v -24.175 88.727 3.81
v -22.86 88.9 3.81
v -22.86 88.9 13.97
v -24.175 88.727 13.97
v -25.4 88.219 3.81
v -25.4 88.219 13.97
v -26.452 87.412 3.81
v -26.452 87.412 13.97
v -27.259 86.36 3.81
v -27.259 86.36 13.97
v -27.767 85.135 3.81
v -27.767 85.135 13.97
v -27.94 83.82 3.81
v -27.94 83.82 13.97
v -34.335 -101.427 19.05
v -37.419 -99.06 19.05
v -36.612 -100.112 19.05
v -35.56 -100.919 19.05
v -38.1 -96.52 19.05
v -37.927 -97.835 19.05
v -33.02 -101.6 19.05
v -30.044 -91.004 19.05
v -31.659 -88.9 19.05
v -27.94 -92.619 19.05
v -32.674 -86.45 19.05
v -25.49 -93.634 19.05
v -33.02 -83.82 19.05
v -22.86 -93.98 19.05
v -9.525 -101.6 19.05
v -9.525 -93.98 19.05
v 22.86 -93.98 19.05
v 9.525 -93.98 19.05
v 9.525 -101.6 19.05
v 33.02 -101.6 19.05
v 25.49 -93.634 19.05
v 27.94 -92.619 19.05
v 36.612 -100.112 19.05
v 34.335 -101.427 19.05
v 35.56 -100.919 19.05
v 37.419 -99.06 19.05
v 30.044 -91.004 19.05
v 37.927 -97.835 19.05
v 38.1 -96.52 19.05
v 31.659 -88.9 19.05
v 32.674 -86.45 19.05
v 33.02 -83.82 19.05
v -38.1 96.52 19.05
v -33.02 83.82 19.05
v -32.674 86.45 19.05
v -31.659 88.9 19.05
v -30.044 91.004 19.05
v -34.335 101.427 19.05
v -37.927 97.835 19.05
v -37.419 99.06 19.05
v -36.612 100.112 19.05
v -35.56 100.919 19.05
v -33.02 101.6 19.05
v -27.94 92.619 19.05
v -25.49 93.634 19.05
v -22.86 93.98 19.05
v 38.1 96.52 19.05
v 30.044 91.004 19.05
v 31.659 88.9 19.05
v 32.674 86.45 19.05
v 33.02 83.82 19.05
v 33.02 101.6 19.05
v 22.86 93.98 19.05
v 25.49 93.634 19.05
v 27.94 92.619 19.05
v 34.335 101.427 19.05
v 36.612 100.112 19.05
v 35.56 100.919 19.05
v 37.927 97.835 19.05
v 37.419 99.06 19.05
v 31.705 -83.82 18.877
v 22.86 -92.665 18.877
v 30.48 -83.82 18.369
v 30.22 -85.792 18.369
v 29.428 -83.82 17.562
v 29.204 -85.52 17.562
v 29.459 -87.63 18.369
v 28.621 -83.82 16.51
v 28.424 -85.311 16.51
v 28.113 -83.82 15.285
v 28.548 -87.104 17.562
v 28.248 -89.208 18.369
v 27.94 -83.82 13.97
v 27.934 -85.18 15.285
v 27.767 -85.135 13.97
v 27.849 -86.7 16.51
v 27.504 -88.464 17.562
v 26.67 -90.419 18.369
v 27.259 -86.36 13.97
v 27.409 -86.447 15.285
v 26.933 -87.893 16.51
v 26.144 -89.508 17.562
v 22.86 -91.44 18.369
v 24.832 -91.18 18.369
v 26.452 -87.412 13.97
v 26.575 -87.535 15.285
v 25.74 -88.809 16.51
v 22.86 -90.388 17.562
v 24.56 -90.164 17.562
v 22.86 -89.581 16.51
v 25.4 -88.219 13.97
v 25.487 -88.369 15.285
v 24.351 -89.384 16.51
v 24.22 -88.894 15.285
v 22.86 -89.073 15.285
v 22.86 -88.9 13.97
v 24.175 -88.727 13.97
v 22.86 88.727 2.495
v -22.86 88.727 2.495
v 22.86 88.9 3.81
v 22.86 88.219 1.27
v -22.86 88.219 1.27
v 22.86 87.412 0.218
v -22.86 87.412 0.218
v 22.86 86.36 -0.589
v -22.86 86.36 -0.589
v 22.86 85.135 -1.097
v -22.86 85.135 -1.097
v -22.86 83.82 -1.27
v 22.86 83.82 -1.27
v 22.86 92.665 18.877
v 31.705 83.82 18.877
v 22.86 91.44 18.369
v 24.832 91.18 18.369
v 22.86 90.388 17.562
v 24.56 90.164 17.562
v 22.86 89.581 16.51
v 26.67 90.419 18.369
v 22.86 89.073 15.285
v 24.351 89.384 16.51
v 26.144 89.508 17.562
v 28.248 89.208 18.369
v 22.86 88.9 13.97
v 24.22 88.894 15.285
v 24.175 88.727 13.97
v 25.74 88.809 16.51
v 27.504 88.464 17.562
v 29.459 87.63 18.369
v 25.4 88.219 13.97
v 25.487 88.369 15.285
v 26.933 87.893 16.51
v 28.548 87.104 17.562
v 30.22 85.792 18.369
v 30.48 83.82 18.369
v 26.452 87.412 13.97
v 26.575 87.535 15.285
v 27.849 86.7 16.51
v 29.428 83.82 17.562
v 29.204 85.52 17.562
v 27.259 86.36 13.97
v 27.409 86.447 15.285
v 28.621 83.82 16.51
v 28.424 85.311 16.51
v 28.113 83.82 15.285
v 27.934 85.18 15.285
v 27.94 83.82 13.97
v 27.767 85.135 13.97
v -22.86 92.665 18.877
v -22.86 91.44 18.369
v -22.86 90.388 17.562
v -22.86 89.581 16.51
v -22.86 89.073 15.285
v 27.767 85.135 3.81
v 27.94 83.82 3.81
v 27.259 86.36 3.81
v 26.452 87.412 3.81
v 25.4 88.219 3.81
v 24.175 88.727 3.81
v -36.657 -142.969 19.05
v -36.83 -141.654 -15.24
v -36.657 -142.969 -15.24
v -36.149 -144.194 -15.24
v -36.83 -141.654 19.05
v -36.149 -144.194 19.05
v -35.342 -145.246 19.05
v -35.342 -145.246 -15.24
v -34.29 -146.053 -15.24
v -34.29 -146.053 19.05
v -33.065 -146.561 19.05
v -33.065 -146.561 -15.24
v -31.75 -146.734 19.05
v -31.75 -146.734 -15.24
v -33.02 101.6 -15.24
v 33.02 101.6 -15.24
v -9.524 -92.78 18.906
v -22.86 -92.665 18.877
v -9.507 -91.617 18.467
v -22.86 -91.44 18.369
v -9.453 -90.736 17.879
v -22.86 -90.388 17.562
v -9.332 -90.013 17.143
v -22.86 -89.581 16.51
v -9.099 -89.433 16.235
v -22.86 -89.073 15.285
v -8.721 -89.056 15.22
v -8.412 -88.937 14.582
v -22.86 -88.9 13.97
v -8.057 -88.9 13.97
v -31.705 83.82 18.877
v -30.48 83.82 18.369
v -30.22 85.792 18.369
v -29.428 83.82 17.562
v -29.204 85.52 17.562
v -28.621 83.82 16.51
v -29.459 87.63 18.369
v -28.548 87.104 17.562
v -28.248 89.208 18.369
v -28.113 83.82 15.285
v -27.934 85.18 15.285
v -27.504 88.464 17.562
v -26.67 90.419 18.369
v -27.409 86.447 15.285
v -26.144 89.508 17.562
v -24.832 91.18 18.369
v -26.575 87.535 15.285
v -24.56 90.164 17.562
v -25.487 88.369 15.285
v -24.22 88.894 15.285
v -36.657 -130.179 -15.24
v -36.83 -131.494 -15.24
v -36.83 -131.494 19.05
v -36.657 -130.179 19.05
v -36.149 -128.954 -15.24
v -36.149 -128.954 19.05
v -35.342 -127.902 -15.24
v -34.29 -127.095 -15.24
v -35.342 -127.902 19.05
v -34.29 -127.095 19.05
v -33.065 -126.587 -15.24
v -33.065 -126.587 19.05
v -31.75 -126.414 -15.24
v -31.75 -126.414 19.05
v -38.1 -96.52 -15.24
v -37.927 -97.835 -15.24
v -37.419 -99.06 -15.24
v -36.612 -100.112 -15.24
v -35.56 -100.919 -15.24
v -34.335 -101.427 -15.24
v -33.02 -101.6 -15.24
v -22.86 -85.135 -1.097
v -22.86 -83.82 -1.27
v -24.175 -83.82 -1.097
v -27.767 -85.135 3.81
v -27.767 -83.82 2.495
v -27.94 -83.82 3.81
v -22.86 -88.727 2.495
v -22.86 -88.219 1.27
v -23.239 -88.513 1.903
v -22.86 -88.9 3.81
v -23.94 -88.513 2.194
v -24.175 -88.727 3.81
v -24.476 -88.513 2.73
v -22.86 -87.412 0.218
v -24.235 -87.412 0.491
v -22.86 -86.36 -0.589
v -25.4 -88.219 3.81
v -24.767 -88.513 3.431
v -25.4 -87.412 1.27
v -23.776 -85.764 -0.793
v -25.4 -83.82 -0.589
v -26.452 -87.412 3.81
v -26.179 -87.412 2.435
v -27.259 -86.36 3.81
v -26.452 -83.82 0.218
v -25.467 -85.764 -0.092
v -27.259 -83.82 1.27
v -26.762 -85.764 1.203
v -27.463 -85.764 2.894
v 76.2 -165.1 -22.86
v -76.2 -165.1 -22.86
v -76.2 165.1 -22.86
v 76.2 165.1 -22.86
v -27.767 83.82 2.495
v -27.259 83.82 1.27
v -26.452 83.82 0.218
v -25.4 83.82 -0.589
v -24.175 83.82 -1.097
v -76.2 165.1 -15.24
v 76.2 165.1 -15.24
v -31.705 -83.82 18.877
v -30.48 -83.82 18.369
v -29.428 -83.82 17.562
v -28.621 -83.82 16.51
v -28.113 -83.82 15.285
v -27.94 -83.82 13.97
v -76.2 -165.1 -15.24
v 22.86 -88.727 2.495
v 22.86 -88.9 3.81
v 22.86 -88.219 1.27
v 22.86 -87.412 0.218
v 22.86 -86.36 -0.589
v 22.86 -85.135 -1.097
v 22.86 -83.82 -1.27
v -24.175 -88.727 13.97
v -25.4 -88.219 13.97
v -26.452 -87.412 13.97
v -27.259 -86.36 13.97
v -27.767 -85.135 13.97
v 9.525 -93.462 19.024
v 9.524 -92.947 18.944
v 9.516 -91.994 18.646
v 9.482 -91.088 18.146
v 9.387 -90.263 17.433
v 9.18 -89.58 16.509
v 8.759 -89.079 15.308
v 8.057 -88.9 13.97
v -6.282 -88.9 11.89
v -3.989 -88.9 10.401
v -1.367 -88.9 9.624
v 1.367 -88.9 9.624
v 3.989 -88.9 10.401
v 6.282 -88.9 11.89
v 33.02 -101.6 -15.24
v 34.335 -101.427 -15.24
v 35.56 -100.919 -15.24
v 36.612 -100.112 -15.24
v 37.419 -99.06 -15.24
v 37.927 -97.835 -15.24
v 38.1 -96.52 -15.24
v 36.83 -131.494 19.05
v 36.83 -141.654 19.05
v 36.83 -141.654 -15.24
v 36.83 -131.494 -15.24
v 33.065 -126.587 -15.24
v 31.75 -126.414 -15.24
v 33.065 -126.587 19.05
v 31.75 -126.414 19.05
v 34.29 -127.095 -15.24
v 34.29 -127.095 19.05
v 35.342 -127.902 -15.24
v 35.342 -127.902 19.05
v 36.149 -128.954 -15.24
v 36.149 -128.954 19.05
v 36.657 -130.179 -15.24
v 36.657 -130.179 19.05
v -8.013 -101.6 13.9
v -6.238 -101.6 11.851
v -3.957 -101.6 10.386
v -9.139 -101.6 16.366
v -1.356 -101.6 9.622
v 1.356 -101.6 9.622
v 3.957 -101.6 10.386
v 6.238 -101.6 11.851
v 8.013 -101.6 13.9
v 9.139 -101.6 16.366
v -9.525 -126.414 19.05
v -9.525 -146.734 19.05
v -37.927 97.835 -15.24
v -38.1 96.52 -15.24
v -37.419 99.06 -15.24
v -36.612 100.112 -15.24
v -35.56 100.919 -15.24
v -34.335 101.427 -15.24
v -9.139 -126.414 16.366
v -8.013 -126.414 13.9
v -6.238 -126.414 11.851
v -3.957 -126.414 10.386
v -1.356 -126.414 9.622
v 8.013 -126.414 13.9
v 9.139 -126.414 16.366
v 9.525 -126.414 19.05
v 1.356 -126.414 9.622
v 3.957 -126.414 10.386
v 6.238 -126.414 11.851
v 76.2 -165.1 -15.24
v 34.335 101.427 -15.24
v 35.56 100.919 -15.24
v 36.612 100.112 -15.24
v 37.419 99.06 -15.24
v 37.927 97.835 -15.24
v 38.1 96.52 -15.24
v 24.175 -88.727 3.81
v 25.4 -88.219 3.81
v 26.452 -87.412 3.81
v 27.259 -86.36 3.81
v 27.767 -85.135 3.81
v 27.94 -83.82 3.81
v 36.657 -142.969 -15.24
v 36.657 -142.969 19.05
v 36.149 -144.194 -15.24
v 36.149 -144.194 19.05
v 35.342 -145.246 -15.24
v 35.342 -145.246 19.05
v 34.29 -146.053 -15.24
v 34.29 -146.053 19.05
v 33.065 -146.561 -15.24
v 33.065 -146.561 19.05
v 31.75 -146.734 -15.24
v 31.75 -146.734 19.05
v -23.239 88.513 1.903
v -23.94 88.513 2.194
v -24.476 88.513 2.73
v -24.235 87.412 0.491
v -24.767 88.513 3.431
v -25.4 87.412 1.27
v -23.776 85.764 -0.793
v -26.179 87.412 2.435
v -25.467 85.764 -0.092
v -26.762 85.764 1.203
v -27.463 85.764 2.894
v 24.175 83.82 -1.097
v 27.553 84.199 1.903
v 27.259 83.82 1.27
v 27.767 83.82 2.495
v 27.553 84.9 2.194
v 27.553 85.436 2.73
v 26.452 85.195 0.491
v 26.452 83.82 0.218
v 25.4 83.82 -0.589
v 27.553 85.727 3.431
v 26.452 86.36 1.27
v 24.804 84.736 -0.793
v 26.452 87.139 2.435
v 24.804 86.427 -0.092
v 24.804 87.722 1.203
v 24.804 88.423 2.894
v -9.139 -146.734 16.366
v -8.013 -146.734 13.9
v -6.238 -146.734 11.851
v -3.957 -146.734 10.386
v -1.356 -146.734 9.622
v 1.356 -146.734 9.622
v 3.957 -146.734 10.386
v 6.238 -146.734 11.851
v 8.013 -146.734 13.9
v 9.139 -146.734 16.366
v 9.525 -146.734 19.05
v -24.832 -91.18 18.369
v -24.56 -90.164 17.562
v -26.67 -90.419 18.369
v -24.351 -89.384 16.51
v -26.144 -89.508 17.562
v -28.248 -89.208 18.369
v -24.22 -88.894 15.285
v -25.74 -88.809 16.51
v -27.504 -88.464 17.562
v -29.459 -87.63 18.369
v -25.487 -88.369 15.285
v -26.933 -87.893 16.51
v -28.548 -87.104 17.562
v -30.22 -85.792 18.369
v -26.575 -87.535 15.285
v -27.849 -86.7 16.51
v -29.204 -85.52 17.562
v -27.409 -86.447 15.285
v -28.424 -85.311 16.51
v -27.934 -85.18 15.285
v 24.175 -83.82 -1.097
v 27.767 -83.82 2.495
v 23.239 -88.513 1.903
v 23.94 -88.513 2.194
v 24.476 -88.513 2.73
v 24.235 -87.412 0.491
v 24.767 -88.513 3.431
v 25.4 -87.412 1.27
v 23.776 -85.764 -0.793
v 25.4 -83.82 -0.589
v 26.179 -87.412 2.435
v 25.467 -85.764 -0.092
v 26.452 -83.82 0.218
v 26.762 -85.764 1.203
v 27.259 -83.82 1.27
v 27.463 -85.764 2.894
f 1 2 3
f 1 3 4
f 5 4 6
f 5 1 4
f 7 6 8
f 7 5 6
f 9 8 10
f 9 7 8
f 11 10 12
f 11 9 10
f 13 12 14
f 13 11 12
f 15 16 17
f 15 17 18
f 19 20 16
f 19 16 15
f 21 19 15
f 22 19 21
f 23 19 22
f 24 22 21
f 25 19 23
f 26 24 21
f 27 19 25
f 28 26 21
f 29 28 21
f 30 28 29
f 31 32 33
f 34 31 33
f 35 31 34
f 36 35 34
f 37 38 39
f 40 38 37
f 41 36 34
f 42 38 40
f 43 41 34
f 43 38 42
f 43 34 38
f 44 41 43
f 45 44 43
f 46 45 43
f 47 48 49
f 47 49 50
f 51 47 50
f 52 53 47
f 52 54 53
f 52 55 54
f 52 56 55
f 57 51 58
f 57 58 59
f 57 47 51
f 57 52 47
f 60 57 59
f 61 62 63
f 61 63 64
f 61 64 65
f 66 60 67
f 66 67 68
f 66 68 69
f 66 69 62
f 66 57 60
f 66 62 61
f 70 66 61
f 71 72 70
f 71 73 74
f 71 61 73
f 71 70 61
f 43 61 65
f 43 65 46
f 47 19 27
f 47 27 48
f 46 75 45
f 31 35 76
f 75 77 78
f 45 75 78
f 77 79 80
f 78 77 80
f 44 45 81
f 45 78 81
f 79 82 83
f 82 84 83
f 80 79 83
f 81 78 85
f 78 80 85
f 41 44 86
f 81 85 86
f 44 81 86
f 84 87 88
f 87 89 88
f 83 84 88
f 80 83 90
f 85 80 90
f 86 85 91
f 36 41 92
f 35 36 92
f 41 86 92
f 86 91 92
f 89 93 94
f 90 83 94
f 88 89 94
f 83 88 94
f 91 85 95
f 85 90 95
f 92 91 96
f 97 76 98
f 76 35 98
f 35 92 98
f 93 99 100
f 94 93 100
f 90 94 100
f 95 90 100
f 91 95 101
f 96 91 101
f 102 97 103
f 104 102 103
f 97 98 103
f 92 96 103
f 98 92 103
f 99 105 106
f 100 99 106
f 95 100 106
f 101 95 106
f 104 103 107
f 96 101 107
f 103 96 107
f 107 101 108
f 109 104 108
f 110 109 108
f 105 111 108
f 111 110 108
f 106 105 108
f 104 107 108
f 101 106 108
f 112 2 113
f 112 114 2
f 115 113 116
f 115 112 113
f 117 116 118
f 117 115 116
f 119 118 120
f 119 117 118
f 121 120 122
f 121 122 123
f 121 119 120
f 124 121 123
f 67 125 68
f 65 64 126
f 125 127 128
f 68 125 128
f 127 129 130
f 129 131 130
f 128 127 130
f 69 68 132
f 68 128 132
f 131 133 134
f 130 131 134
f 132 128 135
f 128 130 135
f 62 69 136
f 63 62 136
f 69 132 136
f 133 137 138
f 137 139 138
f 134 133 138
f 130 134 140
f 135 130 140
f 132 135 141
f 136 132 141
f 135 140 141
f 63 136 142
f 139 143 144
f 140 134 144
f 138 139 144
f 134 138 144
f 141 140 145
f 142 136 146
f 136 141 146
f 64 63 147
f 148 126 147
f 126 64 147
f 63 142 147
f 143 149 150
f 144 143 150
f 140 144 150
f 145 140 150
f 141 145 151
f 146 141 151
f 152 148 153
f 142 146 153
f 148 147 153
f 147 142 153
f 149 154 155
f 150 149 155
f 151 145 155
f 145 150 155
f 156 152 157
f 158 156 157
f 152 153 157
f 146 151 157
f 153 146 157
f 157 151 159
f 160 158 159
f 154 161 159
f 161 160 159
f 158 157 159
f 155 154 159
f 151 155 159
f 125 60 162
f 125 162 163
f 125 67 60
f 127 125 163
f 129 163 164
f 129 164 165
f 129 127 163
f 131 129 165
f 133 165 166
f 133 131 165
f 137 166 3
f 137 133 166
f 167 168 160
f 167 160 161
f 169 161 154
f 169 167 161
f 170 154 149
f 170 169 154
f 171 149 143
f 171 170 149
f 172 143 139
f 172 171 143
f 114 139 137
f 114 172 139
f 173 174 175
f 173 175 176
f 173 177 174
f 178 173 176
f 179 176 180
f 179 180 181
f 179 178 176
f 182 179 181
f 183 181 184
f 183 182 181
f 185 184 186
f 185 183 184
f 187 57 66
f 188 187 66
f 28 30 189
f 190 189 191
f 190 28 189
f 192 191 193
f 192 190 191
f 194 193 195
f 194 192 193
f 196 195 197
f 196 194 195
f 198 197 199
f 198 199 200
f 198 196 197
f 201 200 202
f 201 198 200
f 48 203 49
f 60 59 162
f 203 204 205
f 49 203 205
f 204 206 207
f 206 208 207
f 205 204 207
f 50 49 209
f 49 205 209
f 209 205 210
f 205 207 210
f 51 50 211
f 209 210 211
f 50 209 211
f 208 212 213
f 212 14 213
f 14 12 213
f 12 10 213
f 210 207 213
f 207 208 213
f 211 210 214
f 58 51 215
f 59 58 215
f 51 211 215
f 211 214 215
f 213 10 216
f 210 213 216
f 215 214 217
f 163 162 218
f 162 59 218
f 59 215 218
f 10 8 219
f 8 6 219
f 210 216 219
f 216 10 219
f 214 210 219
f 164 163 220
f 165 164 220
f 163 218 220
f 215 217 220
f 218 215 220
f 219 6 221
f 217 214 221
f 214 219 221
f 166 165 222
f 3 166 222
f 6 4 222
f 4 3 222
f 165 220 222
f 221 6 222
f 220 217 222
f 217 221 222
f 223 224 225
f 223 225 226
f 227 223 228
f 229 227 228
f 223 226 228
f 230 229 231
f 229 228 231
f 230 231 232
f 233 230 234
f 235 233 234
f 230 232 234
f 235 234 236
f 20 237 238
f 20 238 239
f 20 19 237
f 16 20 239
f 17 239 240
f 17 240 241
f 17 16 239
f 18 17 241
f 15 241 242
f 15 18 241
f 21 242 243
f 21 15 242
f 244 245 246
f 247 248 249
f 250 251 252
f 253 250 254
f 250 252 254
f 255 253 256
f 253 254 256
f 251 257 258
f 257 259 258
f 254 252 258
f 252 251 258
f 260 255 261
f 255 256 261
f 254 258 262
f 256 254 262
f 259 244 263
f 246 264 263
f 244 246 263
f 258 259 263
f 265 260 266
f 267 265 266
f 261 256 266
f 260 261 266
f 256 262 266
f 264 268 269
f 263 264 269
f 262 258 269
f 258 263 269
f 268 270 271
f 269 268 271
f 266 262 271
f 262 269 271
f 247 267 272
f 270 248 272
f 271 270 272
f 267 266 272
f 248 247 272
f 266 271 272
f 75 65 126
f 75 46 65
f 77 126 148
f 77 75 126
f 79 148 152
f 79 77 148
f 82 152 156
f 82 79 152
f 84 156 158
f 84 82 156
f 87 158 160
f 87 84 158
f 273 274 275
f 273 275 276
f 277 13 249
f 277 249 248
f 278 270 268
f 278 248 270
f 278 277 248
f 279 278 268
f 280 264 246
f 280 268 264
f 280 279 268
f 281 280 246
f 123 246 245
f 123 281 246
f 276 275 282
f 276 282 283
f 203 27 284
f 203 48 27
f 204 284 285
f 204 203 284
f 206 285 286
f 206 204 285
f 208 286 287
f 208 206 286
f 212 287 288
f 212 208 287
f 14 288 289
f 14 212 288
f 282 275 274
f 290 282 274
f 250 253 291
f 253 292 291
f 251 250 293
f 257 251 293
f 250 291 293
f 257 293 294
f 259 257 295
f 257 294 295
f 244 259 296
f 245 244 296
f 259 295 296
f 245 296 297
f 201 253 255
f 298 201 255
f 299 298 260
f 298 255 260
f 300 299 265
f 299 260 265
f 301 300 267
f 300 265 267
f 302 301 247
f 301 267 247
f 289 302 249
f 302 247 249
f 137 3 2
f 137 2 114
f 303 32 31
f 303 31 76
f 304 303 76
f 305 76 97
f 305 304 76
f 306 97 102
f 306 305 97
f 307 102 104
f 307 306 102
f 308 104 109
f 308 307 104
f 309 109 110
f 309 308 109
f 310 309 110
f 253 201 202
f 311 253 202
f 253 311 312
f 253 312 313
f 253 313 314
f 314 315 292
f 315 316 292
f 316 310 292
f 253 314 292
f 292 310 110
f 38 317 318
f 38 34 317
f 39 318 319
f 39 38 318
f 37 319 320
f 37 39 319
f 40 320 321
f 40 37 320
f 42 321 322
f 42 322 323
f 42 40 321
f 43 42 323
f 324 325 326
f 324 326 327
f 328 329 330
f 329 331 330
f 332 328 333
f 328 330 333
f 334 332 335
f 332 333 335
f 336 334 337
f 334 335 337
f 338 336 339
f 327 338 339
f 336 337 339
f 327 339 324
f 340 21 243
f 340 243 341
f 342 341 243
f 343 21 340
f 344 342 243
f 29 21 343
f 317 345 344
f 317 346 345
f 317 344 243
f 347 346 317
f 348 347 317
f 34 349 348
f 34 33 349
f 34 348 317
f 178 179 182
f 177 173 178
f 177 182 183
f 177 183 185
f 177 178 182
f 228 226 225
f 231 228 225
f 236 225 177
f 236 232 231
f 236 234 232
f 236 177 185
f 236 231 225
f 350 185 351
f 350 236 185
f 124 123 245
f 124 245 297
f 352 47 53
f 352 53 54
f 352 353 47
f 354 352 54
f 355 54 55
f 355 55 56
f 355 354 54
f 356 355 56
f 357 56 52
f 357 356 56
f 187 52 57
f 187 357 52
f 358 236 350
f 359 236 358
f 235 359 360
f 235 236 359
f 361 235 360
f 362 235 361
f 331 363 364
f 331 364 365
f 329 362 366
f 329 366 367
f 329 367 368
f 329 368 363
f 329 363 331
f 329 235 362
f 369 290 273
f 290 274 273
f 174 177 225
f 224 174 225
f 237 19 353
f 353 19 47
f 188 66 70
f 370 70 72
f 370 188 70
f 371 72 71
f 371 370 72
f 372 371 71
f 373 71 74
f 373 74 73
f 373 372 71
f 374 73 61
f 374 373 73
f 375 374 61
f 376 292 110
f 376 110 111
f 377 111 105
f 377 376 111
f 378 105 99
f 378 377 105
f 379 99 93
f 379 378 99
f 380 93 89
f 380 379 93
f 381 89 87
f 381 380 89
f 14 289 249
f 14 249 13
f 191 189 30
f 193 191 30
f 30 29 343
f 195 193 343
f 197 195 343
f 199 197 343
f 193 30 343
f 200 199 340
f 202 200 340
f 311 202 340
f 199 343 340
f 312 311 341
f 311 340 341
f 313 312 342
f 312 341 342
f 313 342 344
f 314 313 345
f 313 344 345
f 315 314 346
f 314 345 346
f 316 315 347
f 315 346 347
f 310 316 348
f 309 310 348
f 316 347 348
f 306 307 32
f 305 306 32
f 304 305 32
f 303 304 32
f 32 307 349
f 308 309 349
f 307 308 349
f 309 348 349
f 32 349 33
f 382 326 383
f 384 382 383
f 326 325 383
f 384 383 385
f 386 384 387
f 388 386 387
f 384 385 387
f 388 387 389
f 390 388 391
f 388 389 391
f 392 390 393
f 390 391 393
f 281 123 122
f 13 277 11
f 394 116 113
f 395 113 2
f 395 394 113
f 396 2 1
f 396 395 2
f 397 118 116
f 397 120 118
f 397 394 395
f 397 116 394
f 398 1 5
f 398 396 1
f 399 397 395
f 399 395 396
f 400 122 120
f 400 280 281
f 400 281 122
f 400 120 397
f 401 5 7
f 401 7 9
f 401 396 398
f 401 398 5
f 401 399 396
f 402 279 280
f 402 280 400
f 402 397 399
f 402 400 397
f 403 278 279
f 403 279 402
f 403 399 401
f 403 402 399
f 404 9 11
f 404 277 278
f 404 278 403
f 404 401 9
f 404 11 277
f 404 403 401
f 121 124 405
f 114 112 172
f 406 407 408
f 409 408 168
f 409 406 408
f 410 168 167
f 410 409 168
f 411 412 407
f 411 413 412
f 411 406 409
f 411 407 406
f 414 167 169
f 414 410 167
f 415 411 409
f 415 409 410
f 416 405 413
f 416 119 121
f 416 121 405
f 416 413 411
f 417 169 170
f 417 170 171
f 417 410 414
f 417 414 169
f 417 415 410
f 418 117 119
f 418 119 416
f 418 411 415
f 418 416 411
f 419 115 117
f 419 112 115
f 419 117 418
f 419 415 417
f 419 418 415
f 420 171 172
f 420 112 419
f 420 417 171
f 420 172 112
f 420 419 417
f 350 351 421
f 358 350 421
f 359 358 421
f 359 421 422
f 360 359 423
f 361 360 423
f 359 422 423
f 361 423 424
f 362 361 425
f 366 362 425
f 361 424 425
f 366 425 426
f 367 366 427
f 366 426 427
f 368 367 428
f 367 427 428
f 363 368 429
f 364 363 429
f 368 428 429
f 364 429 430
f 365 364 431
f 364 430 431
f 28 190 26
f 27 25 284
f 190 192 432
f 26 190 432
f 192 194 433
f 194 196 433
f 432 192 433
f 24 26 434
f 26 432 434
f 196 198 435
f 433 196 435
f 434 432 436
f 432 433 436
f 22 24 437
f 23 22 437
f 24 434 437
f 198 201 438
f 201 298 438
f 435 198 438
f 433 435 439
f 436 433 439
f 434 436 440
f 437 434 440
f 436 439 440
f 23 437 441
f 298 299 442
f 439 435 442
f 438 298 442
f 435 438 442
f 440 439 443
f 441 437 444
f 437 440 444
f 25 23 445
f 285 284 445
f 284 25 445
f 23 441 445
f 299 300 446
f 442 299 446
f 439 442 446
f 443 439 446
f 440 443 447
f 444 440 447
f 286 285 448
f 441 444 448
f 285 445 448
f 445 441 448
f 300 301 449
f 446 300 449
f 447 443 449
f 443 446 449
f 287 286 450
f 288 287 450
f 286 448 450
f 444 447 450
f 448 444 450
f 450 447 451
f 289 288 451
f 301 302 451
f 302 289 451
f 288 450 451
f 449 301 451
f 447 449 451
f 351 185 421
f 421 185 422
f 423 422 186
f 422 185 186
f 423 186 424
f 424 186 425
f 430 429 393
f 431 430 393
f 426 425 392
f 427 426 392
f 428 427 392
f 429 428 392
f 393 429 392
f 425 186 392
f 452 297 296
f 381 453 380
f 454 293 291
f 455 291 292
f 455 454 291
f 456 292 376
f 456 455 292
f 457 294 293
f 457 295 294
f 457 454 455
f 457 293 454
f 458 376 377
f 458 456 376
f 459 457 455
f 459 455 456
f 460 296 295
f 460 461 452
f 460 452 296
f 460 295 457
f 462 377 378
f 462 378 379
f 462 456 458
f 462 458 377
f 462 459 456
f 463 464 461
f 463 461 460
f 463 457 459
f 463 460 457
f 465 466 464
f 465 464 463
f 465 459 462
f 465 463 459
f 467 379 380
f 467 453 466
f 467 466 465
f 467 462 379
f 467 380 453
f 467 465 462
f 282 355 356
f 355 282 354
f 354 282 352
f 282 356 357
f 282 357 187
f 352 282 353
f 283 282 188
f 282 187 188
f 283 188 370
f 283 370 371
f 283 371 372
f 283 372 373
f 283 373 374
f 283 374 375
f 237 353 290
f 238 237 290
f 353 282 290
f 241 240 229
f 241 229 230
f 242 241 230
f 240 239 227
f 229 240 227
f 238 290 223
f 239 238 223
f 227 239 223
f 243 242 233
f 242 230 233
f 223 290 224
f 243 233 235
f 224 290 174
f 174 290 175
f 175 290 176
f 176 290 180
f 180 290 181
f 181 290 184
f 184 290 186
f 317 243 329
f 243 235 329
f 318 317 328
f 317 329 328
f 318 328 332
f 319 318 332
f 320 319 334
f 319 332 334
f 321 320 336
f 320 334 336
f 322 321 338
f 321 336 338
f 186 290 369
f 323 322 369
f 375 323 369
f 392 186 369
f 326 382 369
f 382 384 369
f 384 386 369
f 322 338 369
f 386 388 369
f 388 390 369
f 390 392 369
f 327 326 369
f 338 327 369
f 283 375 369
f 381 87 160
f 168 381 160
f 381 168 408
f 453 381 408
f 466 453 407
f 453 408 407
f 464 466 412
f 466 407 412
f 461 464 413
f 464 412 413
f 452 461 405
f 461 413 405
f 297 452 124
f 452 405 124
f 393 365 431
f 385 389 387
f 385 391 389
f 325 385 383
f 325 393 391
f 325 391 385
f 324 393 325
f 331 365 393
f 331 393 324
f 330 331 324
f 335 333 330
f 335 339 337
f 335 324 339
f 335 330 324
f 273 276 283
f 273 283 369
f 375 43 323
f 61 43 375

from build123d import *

# Parameters (mm, degrees)
F0_W      = 76.2
F0_H      = 203.2
F1_DEPTH  = 19.05
F2_W      = 55.88
F2_H      = 177.8
F3_DEPTH  = 20.32
F4_F1_R   = 5.08
F4_F2_R   = 5.08
F6_DEPTH  = 25.4
F7_W      = 152.4
F7_H      = 330.2
F7_W_2    = 76.2
F7_H_2    = 203.2
F8_DEPTH  = 3.81
F9_W      = 73.66
F9_H      = 20.32
F10_DEPTH = 34.29
F12_DEPTH = 25.4
F13_R     = 5.08


with BuildPart() as f1:
    # F0 (on Top) → F1 (new body, symmetric)
    with BuildSketch(Plane.XY):
        Rectangle(F0_W, F0_H)
    extrude(amount=F1_DEPTH, both=True)

    # F2 (on face) → F3 (cut)
    with BuildSketch(Plane.XY.offset(19.05)):
        Rectangle(F2_W, F2_H)
    extrude(amount=-F3_DEPTH, mode=Mode.SUBTRACT)

    # F4: fillet of radius 5.08 on 9 edges, made by hand

    # F4_f1
    f4_f1_edges = [f1.edges().sort_by_distance(p)[0] for p in [
        (-27.94, 0, -1.27),
        (0, 88.9, -1.27),
        (27.94, 0, -1.27),
        (0, -88.9, -1.27),
        (-27.94, 88.9, 8.89),
        (27.94, 88.9, 8.89),
        (27.94, -88.9, 8.89),
        (-27.94, -88.9, 8.89),
    ]]
    fillet(f4_f1_edges, radius=F4_F1_R)

    # F4_f2
    f4_f2_edges = [f1.edges().sort_by_distance(p)[0] for p in [
        (0, 88.9, 19.05),
        (26.4521024484, 87.4121024484, 19.05),
        (-26.4521024484, 87.4121024484, 19.05),
    ]]
    fillet(f4_f2_edges, radius=F4_F2_R)

    # F5 (on face) → F6 (cut)
    with BuildSketch(Plane.XZ.offset(101.6)):
        with BuildLine():
            Line((9.525, 19.05), (-9.525, 19.05))
            ThreePointArc((-9.525, 19.05), (0, 9.525), (9.525, 19.05))
        make_face()
    extrude(amount=-F6_DEPTH, mode=Mode.SUBTRACT)

    # F7 (on face) → F8 (join, symmetric)
    with BuildSketch(Plane(origin=(0, 0, -19.05), x_dir=(1, 0, 0), z_dir=(0, 0, -1))):
        Rectangle(F7_W, F7_H)
        Rectangle(F7_W_2, F7_H_2, mode=Mode.SUBTRACT)
        Rectangle(F7_W_2, F7_H_2)
    extrude(amount=F8_DEPTH, both=True)

    # F9 (on face) → F10 (join)
    with BuildSketch(Plane.XY.offset(-15.24)):
        with Locations((0, -136.5740124)):
            Rectangle(F9_W, F9_H)
    extrude(amount=F10_DEPTH)

    # F11 (on face) → F12 (cut)
    with BuildSketch(Plane.XZ.offset(146.7340124)):
        with BuildLine():
            Line((9.525, 19.05), (-9.525, 19.05))
            ThreePointArc((-9.525, 19.05), (0, 9.525), (9.525, 19.05))
        make_face()
    extrude(amount=-F12_DEPTH, mode=Mode.SUBTRACT)

    # F13
    f13_edges = [f1.edges().sort_by_distance(p)[0] for p in [
        (38.1, -101.6, 1.905),
        (36.83, -126.414012, 1.905),
        (36.83, -146.734012, 1.905),
        (-36.83, -146.734012, 1.905),
        (-36.83, -126.414012, 1.905),
        (-38.1, -101.6, 1.905),
        (38.1, 101.6, 1.905),
        (-38.1, 101.6, 1.905),
    ]]
    fillet(f13_edges, radius=F13_R)


solid = f1.part
